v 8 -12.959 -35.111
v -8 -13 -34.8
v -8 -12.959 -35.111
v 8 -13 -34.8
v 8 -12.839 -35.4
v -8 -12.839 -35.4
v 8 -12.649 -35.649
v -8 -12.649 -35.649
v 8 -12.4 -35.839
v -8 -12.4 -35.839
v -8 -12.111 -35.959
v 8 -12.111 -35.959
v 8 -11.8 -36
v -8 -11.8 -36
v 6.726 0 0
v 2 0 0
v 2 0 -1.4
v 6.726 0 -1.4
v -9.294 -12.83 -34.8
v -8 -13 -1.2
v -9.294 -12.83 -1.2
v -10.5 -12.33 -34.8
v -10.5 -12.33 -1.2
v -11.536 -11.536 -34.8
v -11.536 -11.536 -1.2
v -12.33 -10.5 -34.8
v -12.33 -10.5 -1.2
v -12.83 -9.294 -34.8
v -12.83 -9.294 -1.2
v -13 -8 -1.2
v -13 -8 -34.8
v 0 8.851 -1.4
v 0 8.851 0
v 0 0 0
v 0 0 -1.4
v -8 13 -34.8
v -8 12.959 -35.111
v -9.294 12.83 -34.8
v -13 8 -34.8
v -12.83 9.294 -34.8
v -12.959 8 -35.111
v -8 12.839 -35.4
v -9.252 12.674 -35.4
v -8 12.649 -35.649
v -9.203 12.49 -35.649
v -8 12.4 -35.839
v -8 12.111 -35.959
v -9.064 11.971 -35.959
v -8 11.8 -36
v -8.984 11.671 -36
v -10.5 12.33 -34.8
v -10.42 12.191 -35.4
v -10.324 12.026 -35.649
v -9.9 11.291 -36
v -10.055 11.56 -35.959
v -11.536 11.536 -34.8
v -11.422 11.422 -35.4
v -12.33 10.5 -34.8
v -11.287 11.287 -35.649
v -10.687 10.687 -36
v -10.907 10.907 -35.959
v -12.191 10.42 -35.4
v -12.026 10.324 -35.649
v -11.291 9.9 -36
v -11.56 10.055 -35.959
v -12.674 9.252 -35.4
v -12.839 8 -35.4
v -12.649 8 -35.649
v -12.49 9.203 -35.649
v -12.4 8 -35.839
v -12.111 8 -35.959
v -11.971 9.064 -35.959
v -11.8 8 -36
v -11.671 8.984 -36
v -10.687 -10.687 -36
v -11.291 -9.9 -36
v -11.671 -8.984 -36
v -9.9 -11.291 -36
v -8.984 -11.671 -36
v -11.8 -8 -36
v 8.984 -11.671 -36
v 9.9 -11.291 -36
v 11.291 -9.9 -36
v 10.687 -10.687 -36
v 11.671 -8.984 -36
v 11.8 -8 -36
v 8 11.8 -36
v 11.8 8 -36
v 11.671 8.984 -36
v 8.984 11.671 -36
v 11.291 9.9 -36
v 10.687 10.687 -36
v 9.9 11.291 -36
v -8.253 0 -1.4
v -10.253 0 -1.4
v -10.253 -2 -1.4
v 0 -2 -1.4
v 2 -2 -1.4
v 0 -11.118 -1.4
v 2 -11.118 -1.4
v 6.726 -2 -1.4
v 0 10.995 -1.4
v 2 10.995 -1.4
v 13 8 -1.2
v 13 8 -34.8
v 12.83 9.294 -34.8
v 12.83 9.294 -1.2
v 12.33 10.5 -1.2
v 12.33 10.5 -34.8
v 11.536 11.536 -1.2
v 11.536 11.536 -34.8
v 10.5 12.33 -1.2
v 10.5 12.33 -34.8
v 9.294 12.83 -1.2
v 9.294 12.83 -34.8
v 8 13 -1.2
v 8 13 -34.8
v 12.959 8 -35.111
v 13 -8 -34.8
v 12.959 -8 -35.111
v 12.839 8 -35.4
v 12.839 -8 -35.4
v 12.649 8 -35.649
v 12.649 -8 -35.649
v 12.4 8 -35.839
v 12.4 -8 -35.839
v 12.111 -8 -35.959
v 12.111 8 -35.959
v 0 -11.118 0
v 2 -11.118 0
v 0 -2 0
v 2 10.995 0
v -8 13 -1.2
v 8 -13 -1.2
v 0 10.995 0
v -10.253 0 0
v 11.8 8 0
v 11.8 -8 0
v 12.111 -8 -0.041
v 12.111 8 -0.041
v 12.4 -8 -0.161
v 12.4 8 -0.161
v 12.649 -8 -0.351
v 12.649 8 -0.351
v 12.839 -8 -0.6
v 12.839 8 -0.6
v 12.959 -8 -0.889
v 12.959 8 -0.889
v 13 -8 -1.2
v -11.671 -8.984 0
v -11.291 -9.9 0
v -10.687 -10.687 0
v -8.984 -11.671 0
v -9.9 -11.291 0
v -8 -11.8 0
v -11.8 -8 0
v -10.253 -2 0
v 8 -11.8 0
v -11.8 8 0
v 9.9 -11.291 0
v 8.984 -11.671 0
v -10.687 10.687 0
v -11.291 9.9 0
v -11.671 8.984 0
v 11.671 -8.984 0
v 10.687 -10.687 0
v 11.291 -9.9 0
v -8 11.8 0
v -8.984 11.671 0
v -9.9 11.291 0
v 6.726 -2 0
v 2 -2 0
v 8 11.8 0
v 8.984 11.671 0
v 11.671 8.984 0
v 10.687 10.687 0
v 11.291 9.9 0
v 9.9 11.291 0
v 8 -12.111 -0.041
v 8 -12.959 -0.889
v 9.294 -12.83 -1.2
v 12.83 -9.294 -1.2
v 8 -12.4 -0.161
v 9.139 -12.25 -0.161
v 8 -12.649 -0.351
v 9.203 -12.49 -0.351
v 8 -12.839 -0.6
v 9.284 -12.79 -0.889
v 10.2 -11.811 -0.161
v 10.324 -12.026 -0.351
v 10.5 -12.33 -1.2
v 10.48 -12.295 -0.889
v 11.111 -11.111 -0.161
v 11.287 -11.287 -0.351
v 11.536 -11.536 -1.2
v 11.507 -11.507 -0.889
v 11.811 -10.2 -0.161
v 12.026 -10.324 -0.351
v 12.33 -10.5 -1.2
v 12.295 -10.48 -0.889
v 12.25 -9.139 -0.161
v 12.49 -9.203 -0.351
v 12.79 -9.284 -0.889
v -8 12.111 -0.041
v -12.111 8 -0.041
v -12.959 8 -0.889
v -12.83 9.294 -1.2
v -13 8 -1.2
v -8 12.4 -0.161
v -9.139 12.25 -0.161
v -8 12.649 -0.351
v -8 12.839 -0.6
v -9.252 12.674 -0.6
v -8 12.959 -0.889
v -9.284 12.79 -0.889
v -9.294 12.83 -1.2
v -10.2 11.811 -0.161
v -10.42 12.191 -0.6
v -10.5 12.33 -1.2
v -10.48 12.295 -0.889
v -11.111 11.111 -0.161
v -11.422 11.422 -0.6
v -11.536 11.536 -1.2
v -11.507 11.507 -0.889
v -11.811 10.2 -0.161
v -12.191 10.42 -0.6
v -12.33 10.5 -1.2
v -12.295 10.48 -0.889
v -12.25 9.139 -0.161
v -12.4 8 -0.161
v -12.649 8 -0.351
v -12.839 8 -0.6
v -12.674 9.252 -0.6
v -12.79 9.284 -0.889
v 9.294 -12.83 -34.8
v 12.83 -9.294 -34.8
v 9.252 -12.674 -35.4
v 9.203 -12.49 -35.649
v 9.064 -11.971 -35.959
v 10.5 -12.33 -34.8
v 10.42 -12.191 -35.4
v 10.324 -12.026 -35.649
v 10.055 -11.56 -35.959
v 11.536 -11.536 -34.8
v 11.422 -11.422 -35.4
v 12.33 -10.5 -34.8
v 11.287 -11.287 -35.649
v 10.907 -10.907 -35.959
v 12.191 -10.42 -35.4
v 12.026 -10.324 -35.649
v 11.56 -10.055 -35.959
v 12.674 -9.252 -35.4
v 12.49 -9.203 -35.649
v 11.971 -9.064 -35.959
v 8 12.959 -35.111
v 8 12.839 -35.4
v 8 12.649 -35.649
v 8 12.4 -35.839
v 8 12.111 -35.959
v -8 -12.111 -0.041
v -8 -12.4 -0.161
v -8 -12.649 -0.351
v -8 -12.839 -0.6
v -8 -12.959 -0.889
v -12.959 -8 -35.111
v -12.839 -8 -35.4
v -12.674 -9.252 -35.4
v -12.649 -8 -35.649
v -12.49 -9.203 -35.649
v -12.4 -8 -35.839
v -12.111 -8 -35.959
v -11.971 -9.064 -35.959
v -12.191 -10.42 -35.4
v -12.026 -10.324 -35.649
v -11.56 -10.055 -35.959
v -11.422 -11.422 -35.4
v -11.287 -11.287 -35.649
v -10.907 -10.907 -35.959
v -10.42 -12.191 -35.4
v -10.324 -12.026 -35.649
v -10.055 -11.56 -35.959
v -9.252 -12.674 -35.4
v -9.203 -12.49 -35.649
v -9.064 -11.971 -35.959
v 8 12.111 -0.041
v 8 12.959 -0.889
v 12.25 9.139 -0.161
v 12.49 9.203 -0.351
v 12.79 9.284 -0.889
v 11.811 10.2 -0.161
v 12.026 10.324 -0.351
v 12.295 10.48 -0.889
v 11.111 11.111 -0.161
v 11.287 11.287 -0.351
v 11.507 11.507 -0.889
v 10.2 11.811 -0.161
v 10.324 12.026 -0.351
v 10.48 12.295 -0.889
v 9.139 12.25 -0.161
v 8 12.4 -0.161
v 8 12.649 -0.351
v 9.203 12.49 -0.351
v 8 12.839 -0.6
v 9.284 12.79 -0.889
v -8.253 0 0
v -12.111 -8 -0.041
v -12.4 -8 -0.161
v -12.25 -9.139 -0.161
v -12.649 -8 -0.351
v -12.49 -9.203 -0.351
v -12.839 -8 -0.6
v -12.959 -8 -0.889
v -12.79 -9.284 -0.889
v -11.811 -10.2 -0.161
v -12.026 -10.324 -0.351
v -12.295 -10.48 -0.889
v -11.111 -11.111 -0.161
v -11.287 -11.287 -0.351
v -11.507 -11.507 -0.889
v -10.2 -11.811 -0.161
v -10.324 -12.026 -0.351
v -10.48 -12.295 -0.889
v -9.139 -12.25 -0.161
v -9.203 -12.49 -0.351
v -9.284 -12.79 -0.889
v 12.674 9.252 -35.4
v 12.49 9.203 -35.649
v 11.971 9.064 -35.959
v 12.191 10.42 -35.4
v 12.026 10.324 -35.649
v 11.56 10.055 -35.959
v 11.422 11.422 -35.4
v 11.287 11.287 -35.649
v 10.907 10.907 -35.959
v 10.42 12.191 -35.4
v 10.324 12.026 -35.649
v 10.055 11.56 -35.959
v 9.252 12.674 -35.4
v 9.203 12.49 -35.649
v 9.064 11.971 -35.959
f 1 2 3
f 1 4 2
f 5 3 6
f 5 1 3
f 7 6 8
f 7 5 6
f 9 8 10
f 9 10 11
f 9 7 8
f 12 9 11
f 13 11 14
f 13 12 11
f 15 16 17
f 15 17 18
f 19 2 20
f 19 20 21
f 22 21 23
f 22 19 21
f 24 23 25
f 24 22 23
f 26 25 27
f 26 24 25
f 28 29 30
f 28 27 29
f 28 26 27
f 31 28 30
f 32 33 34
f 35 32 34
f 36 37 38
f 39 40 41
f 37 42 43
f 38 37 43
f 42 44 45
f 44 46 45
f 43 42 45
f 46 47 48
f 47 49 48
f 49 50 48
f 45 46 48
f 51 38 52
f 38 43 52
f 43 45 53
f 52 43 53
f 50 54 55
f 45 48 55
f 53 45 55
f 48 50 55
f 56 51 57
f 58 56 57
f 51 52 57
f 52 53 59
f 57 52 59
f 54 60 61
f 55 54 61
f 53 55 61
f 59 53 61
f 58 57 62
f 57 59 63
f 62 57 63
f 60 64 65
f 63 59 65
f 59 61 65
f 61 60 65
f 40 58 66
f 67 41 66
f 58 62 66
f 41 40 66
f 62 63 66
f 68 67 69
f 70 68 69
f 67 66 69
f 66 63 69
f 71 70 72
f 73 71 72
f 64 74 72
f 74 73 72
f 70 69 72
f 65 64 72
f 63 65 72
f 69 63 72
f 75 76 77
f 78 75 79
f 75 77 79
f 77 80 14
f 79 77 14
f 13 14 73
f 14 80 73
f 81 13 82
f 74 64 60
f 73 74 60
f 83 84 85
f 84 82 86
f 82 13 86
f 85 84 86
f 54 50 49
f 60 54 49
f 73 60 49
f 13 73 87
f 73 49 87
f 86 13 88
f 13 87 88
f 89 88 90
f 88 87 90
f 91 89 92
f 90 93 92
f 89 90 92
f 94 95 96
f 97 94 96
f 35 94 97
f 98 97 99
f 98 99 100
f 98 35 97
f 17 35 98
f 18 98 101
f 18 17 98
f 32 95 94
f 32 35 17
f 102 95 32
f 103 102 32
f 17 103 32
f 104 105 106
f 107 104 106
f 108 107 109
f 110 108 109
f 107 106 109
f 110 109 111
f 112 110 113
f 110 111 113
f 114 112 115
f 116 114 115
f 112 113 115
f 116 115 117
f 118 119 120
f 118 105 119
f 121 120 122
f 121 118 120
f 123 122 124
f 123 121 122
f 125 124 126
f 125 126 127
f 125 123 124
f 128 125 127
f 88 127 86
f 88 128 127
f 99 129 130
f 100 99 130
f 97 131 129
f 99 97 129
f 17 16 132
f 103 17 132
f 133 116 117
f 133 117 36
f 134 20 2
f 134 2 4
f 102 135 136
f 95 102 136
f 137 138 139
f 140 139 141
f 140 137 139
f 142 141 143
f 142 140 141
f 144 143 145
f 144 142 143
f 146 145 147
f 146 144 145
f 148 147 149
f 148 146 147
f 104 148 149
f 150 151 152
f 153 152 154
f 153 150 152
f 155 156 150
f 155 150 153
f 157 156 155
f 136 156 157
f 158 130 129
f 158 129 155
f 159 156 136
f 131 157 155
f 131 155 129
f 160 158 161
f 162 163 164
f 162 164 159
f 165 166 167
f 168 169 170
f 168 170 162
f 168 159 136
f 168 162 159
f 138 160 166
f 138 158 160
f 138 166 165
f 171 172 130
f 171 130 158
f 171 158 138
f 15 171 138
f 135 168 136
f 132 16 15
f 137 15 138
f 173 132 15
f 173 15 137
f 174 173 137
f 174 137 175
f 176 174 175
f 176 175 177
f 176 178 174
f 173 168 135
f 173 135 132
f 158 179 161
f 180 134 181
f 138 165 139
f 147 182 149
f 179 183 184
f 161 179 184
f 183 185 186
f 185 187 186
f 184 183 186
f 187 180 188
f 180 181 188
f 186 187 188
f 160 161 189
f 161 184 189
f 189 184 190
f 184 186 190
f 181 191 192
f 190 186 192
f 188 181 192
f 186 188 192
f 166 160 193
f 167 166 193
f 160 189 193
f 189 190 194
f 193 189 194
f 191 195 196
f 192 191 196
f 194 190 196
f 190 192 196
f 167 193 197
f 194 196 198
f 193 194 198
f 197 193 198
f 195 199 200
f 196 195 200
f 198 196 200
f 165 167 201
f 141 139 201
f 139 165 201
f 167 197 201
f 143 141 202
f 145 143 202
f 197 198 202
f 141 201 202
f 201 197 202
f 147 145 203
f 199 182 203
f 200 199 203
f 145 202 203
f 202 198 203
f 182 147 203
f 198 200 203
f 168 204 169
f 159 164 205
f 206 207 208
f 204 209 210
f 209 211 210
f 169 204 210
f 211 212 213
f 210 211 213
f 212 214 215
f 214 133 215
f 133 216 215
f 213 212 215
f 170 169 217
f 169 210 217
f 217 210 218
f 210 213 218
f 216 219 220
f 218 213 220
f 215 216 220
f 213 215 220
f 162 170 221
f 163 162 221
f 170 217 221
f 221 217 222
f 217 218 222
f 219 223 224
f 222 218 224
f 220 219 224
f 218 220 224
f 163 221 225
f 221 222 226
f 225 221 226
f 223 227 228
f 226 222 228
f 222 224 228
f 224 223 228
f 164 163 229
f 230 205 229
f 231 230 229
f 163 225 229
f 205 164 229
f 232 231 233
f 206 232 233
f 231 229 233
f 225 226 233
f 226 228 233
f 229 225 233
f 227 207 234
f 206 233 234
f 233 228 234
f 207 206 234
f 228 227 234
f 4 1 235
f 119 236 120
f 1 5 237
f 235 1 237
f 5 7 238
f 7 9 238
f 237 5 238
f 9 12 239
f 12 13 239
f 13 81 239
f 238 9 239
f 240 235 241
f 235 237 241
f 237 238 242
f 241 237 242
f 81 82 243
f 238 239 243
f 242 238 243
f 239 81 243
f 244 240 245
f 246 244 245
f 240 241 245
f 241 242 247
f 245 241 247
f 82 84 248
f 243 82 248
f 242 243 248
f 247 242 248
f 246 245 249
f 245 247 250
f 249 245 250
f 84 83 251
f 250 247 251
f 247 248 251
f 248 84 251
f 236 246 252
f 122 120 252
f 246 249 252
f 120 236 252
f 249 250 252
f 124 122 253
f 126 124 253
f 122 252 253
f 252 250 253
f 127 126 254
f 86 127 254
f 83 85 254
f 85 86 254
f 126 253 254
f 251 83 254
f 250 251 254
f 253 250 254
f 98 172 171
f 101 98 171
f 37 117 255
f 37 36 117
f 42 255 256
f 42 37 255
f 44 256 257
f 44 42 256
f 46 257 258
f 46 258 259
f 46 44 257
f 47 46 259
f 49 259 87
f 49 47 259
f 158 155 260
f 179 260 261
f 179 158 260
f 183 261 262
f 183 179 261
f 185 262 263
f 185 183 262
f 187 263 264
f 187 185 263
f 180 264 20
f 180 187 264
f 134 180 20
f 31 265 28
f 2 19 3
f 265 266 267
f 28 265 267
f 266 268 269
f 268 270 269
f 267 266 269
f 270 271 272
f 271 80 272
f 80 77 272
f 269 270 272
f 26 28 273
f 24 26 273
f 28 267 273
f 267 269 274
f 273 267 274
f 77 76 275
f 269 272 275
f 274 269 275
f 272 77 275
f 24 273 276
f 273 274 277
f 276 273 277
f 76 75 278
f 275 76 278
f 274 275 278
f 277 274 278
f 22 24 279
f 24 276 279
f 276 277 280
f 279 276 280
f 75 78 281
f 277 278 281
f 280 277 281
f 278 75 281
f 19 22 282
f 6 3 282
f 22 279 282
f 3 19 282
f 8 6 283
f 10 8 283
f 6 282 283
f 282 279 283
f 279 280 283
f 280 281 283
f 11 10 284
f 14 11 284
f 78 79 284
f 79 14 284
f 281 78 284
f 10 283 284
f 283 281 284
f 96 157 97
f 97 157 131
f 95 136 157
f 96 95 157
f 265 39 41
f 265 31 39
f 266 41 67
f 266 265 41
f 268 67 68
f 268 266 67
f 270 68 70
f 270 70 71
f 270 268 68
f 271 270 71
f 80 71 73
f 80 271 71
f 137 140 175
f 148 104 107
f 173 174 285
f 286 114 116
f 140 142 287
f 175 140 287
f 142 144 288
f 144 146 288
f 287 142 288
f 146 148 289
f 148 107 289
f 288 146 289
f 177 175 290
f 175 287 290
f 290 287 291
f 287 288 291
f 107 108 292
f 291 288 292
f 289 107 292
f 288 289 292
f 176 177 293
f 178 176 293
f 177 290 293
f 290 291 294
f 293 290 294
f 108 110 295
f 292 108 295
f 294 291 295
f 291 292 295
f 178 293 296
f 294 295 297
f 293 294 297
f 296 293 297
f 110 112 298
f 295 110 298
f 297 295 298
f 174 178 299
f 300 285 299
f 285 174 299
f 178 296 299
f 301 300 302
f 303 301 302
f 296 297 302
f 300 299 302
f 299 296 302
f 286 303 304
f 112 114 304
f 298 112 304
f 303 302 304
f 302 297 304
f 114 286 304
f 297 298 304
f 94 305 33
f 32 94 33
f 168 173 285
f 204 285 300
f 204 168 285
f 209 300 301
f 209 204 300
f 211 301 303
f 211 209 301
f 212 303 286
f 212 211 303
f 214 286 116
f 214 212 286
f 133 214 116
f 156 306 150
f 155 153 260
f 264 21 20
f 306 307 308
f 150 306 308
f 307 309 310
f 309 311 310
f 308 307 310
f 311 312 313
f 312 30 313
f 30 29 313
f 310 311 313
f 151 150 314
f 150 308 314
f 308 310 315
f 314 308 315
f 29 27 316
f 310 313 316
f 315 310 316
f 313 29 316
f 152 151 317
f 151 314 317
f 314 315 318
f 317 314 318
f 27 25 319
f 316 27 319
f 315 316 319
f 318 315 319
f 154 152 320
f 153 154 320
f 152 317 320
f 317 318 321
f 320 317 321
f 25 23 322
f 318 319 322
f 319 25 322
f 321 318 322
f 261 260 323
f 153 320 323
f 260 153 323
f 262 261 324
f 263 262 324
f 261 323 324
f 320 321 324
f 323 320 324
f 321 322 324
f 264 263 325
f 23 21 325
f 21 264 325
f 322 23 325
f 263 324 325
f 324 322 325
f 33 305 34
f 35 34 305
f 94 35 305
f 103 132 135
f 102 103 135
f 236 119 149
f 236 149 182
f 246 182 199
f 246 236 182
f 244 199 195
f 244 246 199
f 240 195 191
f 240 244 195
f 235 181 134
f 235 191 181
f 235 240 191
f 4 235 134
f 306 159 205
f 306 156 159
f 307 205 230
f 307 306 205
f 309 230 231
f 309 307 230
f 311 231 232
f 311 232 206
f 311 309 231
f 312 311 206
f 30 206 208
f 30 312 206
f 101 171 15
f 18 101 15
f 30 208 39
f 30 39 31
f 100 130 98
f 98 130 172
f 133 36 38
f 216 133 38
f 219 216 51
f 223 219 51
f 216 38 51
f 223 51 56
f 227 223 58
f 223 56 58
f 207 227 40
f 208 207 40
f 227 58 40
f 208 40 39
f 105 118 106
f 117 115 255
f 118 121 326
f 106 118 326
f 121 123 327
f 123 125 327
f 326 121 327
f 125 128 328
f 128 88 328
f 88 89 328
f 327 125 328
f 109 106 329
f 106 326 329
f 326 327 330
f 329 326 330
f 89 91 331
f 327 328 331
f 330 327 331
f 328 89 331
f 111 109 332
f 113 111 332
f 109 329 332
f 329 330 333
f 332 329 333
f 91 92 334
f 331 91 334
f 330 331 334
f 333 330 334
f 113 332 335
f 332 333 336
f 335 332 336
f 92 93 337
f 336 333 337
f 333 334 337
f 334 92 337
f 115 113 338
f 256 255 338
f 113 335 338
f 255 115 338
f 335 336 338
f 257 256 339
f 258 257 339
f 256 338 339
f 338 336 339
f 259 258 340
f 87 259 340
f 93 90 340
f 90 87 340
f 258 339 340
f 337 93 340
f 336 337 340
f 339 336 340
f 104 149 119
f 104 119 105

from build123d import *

# Parameters (mm, degrees)
F0_W     = 2
F0_H     = 2
F0_H_2   = 9.117820628
F0_W_2   = 4.7262388766
F1_DEPTH = 36
F2_DEPTH = 1.4
F3_R     = 5
F4_R     = 1.2


with BuildPart() as f1:
    # F0 (on Top) → F1 (new body)
    with BuildSketch(Plane.XY):
        Polygon((13, -13), (13, 0), (13, 13), (-13, 13), (-13, -13), align=None)
        Polygon((-10.2526927367, 0), (0, 10.9954001382), (2, 10.9954001382), (2, 0), (6.7262388766, 0), (6.7262388766, -2), (2, -2), (2, -11.117820628), (0, -11.117820628), (0, -2), (-10.2526927367, -2), align=None, mode=Mode.SUBTRACT)
        Polygon((0, 8.8505196818), (0, 10.9954001382), (-10.2526927367, 0), (-8.2526927367, 0), align=None)
        Polygon((-8.2526927367, 0), (-10.2526927367, 0), (-10.2526927367, -2), (0, -2), (0, 0), align=None)
        Polygon((0, 0), (0, 8.8505196818), (-8.2526927367, 0), align=None)
        Polygon((2, 0), (2, 10.9954001382), (0, 8.8505196818), (0, 0), align=None)
        Polygon((2, 10.9954001382), (0, 10.9954001382), (0, 8.8505196818), align=None)
        with Locations((1, -1)):
            Rectangle(F0_W, F0_H)
        with Locations((1, -6.558910314)):
            Rectangle(F0_W, F0_H_2)
        with Locations((4.3631194383, -1)):
            Rectangle(F0_W_2, F0_H)
    extrude(amount=-F1_DEPTH)

    # F0 (on Top) → F2 (cut)
    with BuildSketch(Plane.XY):
        Polygon((0, 8.8505196818), (0, 10.9954001382), (-10.2526927367, 0), (-8.2526927367, 0), align=None)
        Polygon((2, 10.9954001382), (0, 10.9954001382), (0, 8.8505196818), align=None)
        Polygon((2, 0), (2, 10.9954001382), (0, 8.8505196818), (0, 0), align=None)
        with Locations((4.3631194383, -1)):
            Rectangle(F0_W_2, F0_H)
        with Locations((1, -6.558910314)):
            Rectangle(F0_W, F0_H_2)
        with Locations((1, -1)):
            Rectangle(F0_W, F0_H)
        Polygon((-8.2526927367, 0), (-10.2526927367, 0), (-10.2526927367, -2), (0, -2), (0, 0), align=None)
    extrude(amount=-F2_DEPTH, mode=Mode.SUBTRACT)

    # F3
    f3_edges = [f1.edges().sort_by_distance(p)[0] for p in [
        (13, 13, -18),
        (13, -13, -18),
        (-13, -13, -18),
        (-13, 13, -18),
    ]]
    fillet(f3_edges, radius=F3_R)

    # F4
    f4_edges = [f1.edges().sort_by_distance(p)[0] for p in [
        (-13, 0, 0),
        (-11.535534, 11.535534, 0),
        (0, 13, 0),
        (-11.535534, -11.535534, 0),
        (0, -13, 0),
        (11.535534, -11.535534, 0),
        (13, 0, 0),
        (11.535534, 11.535534, 0),
        (13, 0, -36),
        (11.535534, -11.535534, -36),
        (11.535534, 11.535534, -36),
        (0, -13, -36),
        (0, 13, -36),
        (-11.535534, -11.535534, -36),
        (-11.535534, 11.535534, -36),
        (-13, 0, -36),
    ]]
    fillet(f4_edges, radius=F4_R)


solid = f1.part
